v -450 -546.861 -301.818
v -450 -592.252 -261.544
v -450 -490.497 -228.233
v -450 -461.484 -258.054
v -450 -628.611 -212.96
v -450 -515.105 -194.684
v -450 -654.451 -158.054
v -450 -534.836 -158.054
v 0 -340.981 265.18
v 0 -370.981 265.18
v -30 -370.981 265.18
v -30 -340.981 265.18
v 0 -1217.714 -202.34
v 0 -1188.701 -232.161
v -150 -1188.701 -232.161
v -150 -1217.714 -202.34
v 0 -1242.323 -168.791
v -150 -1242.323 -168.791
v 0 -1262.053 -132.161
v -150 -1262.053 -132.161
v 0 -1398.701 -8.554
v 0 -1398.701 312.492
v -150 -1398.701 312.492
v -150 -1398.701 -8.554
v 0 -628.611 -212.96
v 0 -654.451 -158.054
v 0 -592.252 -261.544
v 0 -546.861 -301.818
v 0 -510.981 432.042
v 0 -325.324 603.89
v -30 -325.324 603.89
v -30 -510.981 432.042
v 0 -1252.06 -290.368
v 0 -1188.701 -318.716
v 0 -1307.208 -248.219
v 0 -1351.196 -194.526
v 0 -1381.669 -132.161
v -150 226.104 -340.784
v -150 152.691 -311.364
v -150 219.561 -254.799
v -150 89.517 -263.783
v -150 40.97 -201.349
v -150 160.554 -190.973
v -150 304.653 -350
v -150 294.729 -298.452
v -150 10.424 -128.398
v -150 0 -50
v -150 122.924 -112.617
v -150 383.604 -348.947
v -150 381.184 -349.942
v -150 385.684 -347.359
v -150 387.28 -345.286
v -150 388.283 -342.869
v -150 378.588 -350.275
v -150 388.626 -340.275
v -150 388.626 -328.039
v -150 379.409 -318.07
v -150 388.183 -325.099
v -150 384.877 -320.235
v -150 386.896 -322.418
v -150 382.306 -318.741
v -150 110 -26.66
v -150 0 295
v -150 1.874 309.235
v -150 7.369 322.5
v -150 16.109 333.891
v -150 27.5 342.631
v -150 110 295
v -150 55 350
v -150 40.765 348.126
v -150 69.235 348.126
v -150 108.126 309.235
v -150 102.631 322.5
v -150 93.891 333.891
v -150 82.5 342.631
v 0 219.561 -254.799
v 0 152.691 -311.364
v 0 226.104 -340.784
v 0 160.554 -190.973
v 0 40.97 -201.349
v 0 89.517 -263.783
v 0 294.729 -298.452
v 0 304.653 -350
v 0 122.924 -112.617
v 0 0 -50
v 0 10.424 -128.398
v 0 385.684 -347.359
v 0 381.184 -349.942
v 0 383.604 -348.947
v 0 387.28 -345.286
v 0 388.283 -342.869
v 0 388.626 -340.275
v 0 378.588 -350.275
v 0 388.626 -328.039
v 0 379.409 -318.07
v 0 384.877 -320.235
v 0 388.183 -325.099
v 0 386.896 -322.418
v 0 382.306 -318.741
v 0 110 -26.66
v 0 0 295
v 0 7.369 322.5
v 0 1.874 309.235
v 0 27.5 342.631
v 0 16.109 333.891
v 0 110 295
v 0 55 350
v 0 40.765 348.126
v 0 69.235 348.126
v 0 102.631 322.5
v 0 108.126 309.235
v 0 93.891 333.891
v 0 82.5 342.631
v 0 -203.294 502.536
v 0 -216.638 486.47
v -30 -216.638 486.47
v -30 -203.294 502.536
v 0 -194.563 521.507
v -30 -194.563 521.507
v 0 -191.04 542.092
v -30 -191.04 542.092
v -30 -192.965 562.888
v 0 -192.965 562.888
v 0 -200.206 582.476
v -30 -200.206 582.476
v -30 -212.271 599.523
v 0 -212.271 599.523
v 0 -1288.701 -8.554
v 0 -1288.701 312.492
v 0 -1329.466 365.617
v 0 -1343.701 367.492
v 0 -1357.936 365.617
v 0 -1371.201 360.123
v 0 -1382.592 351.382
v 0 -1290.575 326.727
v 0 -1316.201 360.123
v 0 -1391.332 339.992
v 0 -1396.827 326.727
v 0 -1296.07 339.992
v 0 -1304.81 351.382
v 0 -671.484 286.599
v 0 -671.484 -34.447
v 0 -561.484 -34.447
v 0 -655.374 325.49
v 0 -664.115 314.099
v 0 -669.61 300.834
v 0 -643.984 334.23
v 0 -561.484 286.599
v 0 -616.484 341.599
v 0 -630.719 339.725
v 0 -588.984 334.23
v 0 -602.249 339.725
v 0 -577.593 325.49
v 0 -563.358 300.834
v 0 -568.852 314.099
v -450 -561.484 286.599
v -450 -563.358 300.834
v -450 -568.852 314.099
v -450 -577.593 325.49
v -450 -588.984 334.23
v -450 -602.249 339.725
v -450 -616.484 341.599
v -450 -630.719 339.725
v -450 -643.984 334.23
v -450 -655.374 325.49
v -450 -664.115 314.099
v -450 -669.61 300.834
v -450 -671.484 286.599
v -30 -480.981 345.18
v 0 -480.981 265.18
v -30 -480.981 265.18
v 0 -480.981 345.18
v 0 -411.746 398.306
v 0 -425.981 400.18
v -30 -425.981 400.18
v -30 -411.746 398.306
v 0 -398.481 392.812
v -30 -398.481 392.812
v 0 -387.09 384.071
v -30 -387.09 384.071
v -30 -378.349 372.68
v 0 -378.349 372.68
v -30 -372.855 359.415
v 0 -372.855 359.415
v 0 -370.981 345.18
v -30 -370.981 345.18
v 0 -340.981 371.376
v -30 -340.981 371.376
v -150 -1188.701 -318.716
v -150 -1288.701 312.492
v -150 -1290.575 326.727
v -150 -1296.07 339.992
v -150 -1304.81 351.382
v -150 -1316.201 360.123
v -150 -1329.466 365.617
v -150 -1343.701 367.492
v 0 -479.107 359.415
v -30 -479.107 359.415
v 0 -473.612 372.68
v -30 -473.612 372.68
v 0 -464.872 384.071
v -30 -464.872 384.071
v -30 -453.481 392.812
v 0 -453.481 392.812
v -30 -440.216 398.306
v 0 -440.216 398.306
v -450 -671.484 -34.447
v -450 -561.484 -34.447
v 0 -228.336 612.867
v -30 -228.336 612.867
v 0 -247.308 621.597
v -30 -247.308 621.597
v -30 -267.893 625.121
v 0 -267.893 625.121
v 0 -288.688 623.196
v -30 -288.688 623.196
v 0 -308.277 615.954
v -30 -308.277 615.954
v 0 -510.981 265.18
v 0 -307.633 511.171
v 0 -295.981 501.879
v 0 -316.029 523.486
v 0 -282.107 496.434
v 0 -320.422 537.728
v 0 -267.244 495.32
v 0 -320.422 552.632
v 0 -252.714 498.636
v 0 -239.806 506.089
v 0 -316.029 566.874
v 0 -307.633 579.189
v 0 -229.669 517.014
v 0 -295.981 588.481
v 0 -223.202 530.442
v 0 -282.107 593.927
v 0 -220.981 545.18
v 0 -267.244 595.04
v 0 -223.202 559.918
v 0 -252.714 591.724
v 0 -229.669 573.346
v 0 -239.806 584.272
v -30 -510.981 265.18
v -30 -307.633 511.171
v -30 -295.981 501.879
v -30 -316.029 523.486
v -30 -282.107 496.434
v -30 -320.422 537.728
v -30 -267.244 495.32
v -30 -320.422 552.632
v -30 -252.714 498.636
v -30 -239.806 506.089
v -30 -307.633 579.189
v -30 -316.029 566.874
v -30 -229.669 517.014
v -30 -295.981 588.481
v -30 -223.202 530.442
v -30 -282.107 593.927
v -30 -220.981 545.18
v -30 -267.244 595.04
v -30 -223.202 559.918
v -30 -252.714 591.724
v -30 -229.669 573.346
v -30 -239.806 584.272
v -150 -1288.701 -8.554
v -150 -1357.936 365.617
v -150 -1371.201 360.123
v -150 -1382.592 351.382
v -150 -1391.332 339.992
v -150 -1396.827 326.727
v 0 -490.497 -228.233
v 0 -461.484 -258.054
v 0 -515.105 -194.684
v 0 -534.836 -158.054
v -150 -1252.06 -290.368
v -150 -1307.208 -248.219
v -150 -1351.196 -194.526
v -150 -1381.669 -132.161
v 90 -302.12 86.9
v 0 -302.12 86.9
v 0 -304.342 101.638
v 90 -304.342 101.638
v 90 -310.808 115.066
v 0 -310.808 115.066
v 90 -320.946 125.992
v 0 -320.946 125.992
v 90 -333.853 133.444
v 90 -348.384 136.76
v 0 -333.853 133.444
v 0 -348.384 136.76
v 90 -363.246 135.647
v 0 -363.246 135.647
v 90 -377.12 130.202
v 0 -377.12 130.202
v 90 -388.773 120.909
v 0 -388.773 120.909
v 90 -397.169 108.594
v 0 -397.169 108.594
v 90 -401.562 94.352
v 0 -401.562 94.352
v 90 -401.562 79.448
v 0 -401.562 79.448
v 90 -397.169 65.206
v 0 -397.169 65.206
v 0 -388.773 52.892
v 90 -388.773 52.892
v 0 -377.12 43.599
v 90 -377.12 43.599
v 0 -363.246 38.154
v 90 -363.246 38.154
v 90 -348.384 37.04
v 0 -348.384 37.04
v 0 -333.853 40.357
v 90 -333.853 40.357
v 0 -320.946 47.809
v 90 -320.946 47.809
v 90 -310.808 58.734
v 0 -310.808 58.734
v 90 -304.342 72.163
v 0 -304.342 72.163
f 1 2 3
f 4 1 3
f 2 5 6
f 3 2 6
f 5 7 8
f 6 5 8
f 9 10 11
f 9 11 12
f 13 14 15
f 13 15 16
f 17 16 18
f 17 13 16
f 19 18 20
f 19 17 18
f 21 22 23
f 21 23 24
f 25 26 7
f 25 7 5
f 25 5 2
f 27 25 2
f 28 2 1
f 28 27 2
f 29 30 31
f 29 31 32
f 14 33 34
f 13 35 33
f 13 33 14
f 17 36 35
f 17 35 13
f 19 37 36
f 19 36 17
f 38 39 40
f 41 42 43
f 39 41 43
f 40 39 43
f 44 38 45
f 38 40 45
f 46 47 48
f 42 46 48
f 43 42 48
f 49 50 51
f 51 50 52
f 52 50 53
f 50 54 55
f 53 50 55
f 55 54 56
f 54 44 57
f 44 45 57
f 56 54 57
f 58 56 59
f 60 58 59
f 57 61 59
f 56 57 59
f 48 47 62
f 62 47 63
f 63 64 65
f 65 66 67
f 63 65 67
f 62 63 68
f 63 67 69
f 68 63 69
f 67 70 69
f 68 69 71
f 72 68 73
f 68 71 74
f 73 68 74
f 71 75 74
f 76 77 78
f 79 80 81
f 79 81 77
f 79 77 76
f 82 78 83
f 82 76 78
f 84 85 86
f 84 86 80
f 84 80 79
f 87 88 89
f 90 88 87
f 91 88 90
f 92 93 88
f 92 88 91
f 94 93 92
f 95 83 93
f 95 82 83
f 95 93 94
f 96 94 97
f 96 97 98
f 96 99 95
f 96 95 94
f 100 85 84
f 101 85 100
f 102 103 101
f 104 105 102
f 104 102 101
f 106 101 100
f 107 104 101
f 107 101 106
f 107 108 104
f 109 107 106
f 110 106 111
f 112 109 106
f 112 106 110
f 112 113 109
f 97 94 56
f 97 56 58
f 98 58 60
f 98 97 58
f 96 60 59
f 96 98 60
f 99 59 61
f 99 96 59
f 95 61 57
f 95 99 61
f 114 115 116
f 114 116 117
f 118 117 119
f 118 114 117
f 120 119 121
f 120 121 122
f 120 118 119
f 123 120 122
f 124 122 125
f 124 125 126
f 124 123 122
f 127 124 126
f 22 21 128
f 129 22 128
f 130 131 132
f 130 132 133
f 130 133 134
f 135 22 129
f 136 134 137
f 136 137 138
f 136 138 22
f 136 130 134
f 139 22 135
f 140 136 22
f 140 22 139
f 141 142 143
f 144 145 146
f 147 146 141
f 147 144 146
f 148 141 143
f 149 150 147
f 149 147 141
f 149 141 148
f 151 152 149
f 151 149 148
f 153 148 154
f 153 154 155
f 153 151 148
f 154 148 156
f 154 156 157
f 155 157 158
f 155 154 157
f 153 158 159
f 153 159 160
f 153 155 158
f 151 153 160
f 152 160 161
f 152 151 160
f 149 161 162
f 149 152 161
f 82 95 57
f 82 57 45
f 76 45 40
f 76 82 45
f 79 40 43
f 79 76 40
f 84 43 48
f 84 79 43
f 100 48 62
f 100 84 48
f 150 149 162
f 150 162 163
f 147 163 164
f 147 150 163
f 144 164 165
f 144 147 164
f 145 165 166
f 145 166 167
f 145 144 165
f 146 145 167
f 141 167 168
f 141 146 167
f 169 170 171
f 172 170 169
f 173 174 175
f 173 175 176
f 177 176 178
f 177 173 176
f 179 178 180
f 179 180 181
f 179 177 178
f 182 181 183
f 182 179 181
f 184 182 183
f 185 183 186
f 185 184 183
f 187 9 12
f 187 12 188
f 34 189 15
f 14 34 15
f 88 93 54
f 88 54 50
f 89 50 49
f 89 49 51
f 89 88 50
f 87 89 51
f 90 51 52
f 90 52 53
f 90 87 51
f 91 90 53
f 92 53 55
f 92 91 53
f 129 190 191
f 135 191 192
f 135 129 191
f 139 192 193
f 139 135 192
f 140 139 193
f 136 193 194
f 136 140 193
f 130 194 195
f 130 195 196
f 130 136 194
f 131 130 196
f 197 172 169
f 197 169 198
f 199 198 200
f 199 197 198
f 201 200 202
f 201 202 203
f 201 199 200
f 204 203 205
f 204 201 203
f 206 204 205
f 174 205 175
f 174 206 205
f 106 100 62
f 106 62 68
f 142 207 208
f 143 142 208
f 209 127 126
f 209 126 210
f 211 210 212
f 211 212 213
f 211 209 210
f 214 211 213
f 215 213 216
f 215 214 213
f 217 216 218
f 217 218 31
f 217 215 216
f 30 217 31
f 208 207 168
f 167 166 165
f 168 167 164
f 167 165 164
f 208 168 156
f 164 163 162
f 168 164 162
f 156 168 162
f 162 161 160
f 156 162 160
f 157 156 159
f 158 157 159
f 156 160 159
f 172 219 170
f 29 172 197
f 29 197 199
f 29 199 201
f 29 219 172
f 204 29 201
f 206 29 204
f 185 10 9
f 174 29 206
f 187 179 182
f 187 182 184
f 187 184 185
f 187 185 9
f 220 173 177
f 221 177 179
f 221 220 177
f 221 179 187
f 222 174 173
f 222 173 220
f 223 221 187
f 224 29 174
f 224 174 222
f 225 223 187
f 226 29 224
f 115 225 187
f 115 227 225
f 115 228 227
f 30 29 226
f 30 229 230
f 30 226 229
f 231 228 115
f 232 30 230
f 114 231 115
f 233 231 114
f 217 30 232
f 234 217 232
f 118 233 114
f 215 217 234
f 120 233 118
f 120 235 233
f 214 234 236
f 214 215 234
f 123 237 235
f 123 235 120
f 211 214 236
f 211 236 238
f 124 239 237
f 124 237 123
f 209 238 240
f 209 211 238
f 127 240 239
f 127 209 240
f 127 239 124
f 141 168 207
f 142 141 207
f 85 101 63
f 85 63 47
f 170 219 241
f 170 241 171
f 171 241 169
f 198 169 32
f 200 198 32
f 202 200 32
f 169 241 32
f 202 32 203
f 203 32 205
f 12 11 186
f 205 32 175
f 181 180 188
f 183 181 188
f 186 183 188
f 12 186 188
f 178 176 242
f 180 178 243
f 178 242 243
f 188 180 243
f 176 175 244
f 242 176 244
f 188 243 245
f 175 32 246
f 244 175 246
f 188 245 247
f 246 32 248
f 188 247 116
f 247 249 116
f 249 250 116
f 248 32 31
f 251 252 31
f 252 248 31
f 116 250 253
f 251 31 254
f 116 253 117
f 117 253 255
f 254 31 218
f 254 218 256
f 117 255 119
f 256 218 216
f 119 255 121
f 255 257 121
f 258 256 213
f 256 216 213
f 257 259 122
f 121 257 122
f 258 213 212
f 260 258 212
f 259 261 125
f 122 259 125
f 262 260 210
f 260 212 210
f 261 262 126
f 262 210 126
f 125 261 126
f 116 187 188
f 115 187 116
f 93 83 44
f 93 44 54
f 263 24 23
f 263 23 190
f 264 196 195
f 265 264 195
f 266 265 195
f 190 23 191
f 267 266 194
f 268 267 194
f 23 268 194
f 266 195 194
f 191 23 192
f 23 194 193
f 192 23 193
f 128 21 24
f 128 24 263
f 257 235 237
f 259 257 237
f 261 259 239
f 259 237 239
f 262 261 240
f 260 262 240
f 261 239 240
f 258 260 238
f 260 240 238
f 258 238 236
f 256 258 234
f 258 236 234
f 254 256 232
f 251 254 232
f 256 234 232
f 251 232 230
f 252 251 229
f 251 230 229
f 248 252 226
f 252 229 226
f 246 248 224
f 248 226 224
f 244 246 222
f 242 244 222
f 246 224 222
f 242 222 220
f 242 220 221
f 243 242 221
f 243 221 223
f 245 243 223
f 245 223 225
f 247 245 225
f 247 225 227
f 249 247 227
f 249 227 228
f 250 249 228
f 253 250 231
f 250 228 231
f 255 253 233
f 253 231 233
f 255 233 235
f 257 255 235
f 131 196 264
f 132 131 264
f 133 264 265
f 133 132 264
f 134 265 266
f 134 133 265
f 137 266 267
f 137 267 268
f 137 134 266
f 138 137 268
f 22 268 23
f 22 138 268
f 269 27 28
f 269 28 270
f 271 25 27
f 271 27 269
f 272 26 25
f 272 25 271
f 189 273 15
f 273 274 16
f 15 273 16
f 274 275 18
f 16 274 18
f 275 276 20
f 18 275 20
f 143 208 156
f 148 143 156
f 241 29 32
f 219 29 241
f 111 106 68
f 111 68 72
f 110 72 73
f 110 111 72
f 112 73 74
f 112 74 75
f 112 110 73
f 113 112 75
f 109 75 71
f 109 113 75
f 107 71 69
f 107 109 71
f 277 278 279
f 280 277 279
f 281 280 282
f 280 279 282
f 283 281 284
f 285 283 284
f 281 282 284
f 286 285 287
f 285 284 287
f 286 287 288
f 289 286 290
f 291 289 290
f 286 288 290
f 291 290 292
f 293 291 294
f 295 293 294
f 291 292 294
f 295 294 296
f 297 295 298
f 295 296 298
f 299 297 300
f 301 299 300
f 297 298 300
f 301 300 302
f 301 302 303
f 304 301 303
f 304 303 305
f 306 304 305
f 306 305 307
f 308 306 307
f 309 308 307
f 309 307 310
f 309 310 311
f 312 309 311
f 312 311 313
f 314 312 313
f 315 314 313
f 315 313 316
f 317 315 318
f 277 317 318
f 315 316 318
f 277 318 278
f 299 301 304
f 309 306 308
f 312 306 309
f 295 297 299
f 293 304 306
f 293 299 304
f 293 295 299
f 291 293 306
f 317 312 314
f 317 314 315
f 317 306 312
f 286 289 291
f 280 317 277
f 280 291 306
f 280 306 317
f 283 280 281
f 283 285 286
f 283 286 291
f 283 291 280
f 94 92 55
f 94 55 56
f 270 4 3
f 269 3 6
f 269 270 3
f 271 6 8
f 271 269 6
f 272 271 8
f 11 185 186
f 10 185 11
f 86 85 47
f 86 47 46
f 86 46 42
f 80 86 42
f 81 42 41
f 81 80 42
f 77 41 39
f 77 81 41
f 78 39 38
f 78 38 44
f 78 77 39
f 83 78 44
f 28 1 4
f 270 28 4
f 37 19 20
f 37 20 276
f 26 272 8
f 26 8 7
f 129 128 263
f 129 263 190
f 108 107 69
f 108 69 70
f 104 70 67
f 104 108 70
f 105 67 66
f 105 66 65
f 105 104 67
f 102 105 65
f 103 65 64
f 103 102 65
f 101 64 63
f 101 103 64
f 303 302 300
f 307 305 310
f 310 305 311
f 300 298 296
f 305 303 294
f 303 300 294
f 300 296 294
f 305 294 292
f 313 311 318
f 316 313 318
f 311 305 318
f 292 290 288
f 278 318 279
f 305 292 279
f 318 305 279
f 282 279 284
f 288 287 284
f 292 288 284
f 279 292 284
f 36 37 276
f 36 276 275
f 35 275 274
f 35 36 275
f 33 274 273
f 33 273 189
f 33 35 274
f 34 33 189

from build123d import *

# Parameters (mm, degrees)
F1_DEPTH = 150
F3_DEPTH = 450
F5_DEPTH = 150
F6_R     = 50
F7_DEPTH = 30
F8_R     = 50
F9_DEPTH = 90


with BuildPart() as f1:
    # F0 (on Right) → F1 (new body)
    with BuildSketch(Plane.YZ):
        with BuildLine():
            Line((0, 295), (0, 0))
            Line((0, 0), (0, -50))
            ThreePointArc((0, -50), (89.517146, -263.783369), (304.652779, -350))
            Line((304.652779, -350), (378.588458, -350.274808))
            ThreePointArc((378.588458, -350.274808), (385.683541, -347.359073), (388.625626, -340.274877))
            Line((388.625626, -340.274877), (388.625626, -328.039452))
            ThreePointArc((388.625626, -328.039452), (385.968449, -321.25101), (379.409036, -318.070186))
            ThreePointArc((379.409036, -318.070186), (187.671621, -225.091904), (110, -26.659758))
            Line((110, -26.659758), (110, 0))
            Line((110, 0), (110, 295))
            ThreePointArc((110, 295), (93.890873, 333.890873), (55, 350))
            ThreePointArc((55, 350), (16.109127, 333.890873), (0, 295))
        make_face()
    extrude(amount=-F1_DEPTH)


with BuildPart() as f3:
    # F2 (on Right) → F3 (new body)
    with BuildSketch(Plane.YZ):
        with BuildLine():
            Line((-671.483598, 286.598697), (-671.483598, 54.492479))
            Line((-671.483598, 54.492479), (-671.483598, -34.446935))
            Line((-671.483598, -34.446935), (-561.483598, -34.446935))
            Line((-561.483598, -34.446935), (-561.483598, 4.492479))
            Line((-561.483598, 4.492479), (-561.483598, 54.492479))
            Line((-561.483598, 54.492479), (-561.483598, 286.598697))
            ThreePointArc((-561.483598, 286.598697), (-577.592725, 325.48957), (-616.483598, 341.598697))
            ThreePointArc((-616.483598, 341.598697), (-655.374471, 325.48957), (-671.483598, 286.598697))
        make_face()
        with BuildLine():
            Line((-534.835678, -158.053732), (-654.451094, -158.053732))
            ThreePointArc((-654.451094, -158.053732), (-611.663176, -238.17344), (-546.860825, -301.817991))
            Line((-546.860825, -301.817991), (-461.483598, -258.053732))
            ThreePointArc((-461.483598, -258.053732), (-503.38347, -211.885522), (-534.835678, -158.053732))
        make_face()
    extrude(amount=-F3_DEPTH)


with BuildPart() as f5:
    # F4 (on Right) → F5 (new body)
    with BuildSketch(Plane.YZ):
        with BuildLine():
            Line((-1398.701041, 312.491503), (-1398.701041, 80.385285))
            Line((-1398.701041, 80.385285), (-1398.701041, -8.554128))
            Line((-1398.701041, -8.554128), (-1288.701041, -8.554128))
            Line((-1288.701041, -8.554128), (-1288.701041, 30.385285))
            Line((-1288.701041, 30.385285), (-1288.701041, 80.385285))
            Line((-1288.701041, 80.385285), (-1288.701041, 312.491503))
            ThreePointArc((-1288.701041, 312.491503), (-1304.810169, 351.382376), (-1343.701041, 367.491503))
            ThreePointArc((-1343.701041, 367.491503), (-1382.591914, 351.382376), (-1398.701041, 312.491503))
        make_face()
        with BuildLine():
            Line((-1262.053121, -132.160926), (-1381.668537, -132.160926))
            ThreePointArc((-1381.668537, -132.160926), (-1307.208482, -248.219295), (-1188.701041, -318.716327))
            Line((-1188.701041, -318.716327), (-1188.701041, -232.160926))
            ThreePointArc((-1188.701041, -232.160926), (-1230.600913, -185.992715), (-1262.053121, -132.160926))
        make_face()
    extrude(amount=-F5_DEPTH)


with BuildPart() as f7:
    # F6 (on Right) → F7 (new body)
    with BuildSketch(Plane.YZ):
        with BuildLine():
            Line((-510.980701, 265.180122), (-480.980701, 265.180122))
            Line((-480.980701, 265.180122), (-480.980701, 332.042155))
            Line((-480.980701, 332.042155), (-480.980701, 345.180122))
            ThreePointArc((-480.980701, 345.180122), (-464.871574, 384.070995), (-425.980701, 400.180122))
            ThreePointArc((-425.980701, 400.180122), (-387.089828, 384.070995), (-370.980701, 345.180122))
            Line((-370.980701, 345.180122), (-370.980701, 265.180122))
            Line((-370.980701, 265.180122), (-340.980701, 265.180122))
            Line((-340.980701, 265.180122), (-340.980701, 371.376031))
            Line((-340.980701, 371.376031), (-216.637744, 486.470302))
            ThreePointArc((-216.637744, 486.470302), (-191.040316, 542.092283), (-212.270881, 599.523079))
            ThreePointArc((-212.270881, 599.523079), (-267.892863, 625.120508), (-325.323658, 603.889942))
            Line((-325.323658, 603.889942), (-510.980701, 432.042155))
            Line((-510.980701, 432.042155), (-510.980701, 265.180122))
        make_face()
        with Locations((-270.980701, 545.180122)):
            Circle(F6_R, mode=Mode.SUBTRACT)
    extrude(amount=-F7_DEPTH)


with BuildPart() as f9:
    # F8 (on Right) → F9 (new body)
    with BuildSketch(Plane.YZ):
        with Locations((-352.12034, 86.900279)):
            Circle(F8_R)
    extrude(amount=F9_DEPTH)


solid = Compound([f1.part, f3.part, f5.part, f7.part, f9.part])
